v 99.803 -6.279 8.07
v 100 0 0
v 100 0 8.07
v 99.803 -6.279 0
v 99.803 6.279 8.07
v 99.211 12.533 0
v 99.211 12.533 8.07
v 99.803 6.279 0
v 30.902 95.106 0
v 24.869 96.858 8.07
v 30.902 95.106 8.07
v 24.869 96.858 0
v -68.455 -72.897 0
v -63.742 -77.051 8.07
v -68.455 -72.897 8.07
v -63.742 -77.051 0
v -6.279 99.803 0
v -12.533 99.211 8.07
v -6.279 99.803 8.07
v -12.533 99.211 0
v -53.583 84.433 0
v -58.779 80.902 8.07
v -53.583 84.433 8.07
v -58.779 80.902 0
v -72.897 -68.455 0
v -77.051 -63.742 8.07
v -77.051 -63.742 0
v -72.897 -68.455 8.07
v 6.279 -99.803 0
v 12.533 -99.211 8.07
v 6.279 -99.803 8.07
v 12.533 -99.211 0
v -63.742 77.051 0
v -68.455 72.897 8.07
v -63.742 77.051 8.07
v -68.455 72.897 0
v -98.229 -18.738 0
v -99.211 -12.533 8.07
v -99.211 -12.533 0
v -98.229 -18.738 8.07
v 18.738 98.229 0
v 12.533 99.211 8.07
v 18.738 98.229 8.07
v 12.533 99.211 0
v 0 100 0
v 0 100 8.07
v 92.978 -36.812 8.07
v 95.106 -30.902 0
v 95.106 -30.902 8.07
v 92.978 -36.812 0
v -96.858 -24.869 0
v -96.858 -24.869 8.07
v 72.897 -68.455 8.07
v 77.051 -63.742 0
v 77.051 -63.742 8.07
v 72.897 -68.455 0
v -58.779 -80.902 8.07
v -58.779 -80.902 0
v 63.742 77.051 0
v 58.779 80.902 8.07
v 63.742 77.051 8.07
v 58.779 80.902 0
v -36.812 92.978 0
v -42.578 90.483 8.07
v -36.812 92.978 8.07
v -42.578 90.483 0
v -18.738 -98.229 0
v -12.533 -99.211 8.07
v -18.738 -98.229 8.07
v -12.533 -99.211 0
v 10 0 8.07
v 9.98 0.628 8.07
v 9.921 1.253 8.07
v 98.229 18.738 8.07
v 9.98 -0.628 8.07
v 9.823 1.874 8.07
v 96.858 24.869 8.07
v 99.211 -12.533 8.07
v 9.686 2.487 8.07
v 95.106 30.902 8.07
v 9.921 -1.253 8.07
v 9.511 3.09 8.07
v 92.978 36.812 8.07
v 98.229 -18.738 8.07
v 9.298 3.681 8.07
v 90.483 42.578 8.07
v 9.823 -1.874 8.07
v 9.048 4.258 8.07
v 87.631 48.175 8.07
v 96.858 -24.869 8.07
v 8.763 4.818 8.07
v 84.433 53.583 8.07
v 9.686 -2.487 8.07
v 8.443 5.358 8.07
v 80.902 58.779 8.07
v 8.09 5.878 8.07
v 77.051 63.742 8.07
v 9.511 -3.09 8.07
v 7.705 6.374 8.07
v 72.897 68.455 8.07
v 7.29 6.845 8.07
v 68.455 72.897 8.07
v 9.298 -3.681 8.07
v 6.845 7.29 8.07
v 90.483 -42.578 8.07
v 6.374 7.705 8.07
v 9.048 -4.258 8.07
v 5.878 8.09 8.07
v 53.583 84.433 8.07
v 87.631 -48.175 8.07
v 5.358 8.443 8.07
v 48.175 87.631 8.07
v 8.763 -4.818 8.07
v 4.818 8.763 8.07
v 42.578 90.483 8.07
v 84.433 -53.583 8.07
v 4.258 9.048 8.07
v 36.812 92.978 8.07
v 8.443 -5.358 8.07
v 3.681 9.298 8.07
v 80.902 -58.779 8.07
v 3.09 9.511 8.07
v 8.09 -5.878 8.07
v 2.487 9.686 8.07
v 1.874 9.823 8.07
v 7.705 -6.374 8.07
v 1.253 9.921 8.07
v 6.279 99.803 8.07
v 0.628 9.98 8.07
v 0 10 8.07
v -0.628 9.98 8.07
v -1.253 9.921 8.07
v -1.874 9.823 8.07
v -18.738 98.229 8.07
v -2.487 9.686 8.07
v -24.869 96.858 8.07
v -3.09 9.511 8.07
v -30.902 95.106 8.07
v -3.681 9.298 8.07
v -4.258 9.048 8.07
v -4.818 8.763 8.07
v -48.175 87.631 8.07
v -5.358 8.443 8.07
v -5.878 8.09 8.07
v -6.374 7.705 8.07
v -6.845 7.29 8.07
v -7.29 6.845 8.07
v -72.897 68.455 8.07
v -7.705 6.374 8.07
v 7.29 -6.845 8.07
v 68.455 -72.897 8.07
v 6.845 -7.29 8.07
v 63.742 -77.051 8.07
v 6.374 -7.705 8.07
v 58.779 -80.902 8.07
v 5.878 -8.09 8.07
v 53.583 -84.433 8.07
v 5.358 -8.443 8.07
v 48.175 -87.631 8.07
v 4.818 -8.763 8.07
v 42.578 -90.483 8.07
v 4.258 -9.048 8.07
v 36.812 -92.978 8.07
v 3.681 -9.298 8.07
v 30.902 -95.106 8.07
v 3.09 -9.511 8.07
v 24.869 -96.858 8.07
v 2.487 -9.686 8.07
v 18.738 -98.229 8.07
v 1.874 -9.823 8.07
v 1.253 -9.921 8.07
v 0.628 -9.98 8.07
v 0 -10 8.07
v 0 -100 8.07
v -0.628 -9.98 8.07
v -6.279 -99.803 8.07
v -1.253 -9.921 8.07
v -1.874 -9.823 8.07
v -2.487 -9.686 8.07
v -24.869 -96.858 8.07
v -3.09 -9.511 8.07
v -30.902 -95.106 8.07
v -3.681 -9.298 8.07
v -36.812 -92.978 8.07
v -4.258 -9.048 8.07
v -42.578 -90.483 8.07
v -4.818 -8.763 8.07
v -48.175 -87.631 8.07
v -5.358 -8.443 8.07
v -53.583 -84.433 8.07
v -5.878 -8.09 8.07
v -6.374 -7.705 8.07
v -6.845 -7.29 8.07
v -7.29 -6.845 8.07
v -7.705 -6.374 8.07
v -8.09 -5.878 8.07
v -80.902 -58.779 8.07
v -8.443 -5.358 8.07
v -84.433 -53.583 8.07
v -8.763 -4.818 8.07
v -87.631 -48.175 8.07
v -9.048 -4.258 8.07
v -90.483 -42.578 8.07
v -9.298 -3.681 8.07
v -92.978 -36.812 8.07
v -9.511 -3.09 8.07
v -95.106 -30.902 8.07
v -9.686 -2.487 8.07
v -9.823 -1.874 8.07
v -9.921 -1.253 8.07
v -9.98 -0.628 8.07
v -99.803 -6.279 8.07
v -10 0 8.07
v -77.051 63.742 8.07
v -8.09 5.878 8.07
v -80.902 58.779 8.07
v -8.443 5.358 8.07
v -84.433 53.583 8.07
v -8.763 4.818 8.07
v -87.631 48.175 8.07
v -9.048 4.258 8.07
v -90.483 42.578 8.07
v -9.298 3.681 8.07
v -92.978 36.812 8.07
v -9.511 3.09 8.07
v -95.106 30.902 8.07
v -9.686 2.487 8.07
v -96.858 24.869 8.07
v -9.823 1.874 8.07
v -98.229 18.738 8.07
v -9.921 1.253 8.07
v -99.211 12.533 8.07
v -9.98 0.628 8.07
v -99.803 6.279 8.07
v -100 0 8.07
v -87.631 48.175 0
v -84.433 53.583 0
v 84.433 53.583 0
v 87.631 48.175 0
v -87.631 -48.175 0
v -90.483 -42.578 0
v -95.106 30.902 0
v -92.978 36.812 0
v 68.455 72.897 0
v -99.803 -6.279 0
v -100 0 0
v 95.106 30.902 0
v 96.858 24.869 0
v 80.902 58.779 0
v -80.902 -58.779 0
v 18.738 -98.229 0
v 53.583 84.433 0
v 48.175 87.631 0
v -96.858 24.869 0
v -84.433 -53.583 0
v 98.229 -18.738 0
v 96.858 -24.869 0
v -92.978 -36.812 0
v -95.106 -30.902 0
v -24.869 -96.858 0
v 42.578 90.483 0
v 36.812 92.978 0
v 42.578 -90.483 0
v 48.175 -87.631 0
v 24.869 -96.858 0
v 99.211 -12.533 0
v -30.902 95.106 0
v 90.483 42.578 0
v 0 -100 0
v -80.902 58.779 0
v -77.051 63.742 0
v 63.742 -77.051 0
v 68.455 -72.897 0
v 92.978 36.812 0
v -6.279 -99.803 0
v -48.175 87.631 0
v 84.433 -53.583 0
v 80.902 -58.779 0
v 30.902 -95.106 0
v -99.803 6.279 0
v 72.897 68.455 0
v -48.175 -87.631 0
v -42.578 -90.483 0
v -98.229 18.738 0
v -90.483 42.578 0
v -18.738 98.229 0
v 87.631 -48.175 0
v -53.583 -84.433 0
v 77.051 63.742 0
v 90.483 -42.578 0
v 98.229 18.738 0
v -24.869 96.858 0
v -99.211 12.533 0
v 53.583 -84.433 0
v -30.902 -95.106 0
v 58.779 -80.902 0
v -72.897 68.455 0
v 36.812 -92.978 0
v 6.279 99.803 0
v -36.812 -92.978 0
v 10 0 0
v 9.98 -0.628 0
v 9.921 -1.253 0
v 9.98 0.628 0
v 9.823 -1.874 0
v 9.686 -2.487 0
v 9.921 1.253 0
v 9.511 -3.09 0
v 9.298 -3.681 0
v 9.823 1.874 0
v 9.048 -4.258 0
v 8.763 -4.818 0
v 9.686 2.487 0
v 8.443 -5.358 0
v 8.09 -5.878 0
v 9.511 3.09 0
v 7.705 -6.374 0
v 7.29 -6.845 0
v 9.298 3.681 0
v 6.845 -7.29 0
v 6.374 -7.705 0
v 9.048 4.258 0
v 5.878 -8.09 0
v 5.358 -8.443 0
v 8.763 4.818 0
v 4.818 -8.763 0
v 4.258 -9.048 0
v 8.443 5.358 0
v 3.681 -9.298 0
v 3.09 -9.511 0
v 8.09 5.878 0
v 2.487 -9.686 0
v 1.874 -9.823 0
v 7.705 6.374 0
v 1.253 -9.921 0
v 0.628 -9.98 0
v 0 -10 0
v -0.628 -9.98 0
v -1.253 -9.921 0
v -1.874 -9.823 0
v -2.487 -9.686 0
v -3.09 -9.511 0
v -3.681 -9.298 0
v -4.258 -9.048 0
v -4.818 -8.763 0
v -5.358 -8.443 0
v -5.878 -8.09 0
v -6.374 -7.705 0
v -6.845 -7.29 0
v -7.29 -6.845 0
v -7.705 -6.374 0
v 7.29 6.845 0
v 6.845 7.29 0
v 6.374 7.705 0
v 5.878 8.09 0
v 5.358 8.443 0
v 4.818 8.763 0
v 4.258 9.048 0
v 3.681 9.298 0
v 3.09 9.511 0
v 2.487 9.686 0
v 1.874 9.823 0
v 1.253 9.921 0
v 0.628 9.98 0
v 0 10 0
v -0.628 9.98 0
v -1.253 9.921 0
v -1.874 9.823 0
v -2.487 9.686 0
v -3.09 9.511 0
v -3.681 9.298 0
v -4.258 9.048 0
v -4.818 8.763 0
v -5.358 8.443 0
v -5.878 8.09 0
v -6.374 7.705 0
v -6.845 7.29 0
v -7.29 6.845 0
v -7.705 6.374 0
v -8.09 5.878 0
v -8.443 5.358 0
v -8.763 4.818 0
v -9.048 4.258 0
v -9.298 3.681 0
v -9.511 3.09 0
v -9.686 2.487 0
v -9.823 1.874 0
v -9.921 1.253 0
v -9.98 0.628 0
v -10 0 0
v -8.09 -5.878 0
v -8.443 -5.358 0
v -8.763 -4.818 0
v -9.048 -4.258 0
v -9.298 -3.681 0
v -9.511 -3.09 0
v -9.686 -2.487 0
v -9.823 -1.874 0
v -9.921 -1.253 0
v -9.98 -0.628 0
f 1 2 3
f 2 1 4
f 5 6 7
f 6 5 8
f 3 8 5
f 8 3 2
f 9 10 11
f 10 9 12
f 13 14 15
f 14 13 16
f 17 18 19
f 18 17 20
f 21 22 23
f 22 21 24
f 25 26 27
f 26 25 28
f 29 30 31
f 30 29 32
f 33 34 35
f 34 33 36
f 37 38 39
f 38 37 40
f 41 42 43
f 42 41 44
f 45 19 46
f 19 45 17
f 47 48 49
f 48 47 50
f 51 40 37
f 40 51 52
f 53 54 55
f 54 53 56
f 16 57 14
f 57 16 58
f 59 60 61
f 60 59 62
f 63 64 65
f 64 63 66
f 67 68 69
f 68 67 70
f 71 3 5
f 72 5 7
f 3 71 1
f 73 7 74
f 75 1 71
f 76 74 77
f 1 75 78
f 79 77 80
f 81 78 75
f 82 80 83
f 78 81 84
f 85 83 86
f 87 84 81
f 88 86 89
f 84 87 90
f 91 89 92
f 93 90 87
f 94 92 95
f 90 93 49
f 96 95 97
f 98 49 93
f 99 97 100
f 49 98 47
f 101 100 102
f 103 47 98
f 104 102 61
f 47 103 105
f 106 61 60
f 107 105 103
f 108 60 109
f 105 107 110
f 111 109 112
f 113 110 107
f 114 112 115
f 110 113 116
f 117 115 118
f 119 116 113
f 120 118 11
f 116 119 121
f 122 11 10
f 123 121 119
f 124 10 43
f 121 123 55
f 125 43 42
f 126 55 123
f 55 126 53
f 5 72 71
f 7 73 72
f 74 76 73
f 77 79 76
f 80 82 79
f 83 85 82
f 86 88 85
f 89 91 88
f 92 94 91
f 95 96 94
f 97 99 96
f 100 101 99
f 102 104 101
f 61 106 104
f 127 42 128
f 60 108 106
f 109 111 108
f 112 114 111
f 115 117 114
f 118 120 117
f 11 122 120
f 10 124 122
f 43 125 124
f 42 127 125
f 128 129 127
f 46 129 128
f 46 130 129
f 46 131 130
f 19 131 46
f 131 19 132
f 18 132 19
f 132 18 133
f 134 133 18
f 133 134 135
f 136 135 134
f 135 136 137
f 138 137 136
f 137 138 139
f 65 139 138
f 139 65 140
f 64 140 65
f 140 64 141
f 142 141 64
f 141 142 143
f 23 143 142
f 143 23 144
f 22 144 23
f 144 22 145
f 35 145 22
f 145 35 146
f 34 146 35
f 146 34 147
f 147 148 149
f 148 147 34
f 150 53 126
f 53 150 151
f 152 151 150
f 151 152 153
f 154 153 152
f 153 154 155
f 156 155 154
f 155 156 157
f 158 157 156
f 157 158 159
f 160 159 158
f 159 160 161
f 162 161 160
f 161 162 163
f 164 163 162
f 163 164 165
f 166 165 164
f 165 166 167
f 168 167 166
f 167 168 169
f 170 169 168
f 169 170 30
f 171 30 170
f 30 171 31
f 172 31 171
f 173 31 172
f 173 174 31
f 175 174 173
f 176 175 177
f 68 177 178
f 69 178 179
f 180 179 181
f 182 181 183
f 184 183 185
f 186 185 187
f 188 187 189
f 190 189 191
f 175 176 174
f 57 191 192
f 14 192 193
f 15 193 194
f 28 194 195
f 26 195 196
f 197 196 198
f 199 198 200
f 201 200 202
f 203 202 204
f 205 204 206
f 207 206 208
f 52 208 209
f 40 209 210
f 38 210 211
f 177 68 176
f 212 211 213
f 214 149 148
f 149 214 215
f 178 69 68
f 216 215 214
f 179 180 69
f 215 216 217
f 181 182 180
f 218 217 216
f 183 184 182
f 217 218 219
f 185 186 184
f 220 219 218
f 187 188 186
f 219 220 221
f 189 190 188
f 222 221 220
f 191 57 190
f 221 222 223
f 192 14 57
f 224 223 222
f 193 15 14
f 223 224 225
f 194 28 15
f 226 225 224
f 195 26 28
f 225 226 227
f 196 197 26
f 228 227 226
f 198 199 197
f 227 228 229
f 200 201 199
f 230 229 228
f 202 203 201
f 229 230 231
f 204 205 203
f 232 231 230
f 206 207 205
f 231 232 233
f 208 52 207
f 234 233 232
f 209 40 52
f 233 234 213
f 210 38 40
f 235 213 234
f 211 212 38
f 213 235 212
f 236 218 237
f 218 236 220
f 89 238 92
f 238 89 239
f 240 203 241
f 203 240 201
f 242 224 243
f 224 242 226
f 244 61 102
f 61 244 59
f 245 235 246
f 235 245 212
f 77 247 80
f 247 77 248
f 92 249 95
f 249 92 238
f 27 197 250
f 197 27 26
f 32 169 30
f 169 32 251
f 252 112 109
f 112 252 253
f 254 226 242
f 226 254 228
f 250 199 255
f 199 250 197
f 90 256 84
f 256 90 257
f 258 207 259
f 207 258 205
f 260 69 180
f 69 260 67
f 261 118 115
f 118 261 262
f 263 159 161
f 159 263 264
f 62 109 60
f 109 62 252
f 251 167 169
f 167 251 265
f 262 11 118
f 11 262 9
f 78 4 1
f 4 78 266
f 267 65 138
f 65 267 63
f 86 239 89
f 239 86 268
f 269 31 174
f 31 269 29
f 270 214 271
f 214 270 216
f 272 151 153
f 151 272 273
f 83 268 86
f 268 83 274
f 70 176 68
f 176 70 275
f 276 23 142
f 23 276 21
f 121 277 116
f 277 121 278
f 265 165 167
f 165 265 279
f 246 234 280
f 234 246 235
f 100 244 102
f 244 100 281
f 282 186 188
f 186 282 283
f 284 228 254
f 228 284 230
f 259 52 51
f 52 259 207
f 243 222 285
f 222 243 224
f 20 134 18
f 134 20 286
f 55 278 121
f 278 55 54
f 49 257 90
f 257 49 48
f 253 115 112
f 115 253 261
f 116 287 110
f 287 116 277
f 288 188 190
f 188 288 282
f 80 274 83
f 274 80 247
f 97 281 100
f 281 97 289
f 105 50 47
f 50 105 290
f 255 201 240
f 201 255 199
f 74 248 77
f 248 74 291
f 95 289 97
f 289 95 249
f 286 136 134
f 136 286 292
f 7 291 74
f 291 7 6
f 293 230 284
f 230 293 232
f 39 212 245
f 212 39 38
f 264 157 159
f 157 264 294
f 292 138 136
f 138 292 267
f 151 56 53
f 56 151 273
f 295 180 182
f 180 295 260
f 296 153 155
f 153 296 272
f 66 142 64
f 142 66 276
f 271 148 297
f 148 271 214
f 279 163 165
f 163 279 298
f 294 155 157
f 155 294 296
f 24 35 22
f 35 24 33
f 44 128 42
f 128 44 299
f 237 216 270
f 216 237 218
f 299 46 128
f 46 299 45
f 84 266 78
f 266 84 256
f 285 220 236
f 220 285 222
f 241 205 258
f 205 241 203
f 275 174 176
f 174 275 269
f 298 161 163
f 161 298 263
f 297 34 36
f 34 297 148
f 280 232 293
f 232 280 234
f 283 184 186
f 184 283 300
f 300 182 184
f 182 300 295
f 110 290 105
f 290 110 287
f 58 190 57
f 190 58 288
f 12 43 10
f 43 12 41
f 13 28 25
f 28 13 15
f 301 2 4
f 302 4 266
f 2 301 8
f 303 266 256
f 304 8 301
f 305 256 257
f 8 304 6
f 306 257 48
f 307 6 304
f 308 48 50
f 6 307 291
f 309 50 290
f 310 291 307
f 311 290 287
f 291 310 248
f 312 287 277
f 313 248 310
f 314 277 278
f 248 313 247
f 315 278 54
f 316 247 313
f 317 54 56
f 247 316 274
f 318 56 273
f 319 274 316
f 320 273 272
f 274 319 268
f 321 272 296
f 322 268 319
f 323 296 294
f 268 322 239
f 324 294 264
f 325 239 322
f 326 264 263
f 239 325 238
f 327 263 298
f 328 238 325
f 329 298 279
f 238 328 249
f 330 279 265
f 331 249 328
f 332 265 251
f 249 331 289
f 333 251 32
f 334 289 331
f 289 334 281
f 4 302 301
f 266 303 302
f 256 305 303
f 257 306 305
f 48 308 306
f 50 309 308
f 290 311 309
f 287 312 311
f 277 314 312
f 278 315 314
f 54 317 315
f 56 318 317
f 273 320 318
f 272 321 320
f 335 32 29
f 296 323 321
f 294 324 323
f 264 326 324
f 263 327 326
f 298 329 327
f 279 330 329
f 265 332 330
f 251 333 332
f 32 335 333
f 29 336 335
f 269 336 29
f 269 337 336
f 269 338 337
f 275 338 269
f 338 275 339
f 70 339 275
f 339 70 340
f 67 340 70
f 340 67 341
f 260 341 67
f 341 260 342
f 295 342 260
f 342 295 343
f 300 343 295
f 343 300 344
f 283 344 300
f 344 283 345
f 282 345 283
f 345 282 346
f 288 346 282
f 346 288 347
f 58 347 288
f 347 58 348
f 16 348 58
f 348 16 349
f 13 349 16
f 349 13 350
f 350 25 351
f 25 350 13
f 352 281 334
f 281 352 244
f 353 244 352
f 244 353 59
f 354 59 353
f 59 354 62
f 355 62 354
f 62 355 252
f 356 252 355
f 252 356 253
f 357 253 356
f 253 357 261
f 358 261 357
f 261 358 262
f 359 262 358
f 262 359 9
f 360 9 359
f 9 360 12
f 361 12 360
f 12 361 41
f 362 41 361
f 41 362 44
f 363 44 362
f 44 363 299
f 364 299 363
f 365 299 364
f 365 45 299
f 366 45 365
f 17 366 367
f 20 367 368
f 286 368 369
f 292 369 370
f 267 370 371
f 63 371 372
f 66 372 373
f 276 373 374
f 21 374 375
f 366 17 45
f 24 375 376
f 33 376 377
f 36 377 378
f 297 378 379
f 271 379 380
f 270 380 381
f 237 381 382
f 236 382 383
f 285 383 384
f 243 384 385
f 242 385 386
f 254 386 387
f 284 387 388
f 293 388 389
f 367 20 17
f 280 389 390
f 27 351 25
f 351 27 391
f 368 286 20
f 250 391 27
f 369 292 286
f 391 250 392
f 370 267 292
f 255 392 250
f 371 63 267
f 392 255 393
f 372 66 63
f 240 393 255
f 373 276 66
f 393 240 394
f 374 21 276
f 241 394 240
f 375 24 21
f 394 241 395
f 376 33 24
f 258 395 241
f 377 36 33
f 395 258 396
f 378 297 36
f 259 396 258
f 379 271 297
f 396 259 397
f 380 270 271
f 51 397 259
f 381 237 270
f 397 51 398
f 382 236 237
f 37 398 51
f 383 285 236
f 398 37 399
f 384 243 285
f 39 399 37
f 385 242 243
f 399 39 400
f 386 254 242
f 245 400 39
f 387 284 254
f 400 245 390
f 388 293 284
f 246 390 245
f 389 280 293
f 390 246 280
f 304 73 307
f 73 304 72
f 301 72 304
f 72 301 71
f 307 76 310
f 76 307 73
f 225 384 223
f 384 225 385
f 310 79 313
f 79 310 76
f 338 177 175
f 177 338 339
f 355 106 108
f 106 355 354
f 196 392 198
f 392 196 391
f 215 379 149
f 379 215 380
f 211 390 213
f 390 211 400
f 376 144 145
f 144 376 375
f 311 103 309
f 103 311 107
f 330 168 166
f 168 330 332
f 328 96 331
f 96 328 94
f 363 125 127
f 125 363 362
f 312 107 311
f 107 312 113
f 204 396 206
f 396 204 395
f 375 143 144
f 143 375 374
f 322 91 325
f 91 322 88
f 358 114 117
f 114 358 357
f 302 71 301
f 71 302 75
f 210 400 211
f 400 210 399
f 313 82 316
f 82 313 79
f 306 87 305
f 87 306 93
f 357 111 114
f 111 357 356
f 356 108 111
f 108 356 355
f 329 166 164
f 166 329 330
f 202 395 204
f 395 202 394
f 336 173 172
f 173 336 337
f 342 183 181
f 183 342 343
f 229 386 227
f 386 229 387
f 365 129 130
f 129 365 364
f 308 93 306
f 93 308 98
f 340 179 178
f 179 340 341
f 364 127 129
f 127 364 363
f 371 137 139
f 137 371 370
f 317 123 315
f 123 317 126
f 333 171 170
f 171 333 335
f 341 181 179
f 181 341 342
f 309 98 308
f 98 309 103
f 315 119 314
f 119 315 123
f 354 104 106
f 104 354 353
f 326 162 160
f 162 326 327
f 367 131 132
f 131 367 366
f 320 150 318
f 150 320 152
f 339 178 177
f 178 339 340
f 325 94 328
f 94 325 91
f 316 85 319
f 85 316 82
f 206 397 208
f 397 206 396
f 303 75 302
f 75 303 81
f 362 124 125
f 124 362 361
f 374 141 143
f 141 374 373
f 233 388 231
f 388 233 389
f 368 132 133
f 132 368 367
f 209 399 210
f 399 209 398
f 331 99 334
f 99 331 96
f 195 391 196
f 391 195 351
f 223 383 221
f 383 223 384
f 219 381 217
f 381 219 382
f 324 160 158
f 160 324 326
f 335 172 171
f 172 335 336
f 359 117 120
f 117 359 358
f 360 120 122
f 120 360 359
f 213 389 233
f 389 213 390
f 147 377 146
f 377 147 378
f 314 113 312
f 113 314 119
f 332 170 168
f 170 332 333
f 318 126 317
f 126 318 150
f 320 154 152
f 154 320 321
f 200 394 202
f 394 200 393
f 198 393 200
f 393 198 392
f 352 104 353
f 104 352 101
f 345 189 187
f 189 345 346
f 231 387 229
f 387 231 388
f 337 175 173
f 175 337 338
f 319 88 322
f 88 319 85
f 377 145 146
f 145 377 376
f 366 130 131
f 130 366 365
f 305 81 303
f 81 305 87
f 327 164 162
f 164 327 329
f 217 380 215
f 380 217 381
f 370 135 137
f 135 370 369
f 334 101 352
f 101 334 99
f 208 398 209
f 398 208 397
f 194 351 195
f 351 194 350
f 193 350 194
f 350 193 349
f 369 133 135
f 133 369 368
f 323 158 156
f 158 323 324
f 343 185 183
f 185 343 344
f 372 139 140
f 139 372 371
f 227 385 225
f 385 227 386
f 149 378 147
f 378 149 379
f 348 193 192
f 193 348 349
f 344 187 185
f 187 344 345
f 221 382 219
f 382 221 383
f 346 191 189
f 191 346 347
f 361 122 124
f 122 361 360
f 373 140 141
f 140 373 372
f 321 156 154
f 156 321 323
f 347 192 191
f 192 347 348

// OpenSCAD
// Rotor plate with magnets
$fn = 100;

module rotor() {
    difference() {
        // Main disk
        cylinder(h=8.069980123839466, d=200);

        // Center hole
        translate([0, 0, -1])
            cylinder(h=10.069980123839466, d=20);
    }

    // Magnets
    
    // Magnet 1
    translate([70.0 * cos(0.0), 70.0 * sin(0.0), 0])
        rotate([0, 0, 0.0])
        cylinder(h=3.0699801238394655, 
                d=43.982297150257104,
                $fn=30);

    // Magnet 2
    translate([70.0 * cos(45.0), 70.0 * sin(45.0), 0])
        rotate([0, 0, 45.0])
        cylinder(h=3.0699801238394655, 
                d=43.982297150257104,
                $fn=30);

    // Magnet 3
    translate([70.0 * cos(90.0), 70.0 * sin(90.0), 0])
        rotate([0, 0, 90.0])
        cylinder(h=3.0699801238394655, 
                d=43.982297150257104,
                $fn=30);

    // Magnet 4
    translate([70.0 * cos(135.0), 70.0 * sin(135.0), 0])
        rotate([0, 0, 135.0])
        cylinder(h=3.0699801238394655, 
                d=43.982297150257104,
                $fn=30);

    // Magnet 5
    translate([70.0 * cos(180.0), 70.0 * sin(180.0), 0])
        rotate([0, 0, 180.0])
        cylinder(h=3.0699801238394655, 
                d=43.982297150257104,
                $fn=30);

    // Magnet 6
    translate([70.0 * cos(225.0), 70.0 * sin(225.0), 0])
        rotate([0, 0, 225.0])
        cylinder(h=3.0699801238394655, 
                d=43.982297150257104,
                $fn=30);

    // Magnet 7
    translate([70.0 * cos(270.0), 70.0 * sin(270.0), 0])
        rotate([0, 0, 270.0])
        cylinder(h=3.0699801238394655, 
                d=43.982297150257104,
                $fn=30);

    // Magnet 8
    translate([70.0 * cos(315.0), 70.0 * sin(315.0), 0])
        rotate([0, 0, 315.0])
        cylinder(h=3.0699801238394655, 
                d=43.982297150257104,
                $fn=30);
}

rotor();
